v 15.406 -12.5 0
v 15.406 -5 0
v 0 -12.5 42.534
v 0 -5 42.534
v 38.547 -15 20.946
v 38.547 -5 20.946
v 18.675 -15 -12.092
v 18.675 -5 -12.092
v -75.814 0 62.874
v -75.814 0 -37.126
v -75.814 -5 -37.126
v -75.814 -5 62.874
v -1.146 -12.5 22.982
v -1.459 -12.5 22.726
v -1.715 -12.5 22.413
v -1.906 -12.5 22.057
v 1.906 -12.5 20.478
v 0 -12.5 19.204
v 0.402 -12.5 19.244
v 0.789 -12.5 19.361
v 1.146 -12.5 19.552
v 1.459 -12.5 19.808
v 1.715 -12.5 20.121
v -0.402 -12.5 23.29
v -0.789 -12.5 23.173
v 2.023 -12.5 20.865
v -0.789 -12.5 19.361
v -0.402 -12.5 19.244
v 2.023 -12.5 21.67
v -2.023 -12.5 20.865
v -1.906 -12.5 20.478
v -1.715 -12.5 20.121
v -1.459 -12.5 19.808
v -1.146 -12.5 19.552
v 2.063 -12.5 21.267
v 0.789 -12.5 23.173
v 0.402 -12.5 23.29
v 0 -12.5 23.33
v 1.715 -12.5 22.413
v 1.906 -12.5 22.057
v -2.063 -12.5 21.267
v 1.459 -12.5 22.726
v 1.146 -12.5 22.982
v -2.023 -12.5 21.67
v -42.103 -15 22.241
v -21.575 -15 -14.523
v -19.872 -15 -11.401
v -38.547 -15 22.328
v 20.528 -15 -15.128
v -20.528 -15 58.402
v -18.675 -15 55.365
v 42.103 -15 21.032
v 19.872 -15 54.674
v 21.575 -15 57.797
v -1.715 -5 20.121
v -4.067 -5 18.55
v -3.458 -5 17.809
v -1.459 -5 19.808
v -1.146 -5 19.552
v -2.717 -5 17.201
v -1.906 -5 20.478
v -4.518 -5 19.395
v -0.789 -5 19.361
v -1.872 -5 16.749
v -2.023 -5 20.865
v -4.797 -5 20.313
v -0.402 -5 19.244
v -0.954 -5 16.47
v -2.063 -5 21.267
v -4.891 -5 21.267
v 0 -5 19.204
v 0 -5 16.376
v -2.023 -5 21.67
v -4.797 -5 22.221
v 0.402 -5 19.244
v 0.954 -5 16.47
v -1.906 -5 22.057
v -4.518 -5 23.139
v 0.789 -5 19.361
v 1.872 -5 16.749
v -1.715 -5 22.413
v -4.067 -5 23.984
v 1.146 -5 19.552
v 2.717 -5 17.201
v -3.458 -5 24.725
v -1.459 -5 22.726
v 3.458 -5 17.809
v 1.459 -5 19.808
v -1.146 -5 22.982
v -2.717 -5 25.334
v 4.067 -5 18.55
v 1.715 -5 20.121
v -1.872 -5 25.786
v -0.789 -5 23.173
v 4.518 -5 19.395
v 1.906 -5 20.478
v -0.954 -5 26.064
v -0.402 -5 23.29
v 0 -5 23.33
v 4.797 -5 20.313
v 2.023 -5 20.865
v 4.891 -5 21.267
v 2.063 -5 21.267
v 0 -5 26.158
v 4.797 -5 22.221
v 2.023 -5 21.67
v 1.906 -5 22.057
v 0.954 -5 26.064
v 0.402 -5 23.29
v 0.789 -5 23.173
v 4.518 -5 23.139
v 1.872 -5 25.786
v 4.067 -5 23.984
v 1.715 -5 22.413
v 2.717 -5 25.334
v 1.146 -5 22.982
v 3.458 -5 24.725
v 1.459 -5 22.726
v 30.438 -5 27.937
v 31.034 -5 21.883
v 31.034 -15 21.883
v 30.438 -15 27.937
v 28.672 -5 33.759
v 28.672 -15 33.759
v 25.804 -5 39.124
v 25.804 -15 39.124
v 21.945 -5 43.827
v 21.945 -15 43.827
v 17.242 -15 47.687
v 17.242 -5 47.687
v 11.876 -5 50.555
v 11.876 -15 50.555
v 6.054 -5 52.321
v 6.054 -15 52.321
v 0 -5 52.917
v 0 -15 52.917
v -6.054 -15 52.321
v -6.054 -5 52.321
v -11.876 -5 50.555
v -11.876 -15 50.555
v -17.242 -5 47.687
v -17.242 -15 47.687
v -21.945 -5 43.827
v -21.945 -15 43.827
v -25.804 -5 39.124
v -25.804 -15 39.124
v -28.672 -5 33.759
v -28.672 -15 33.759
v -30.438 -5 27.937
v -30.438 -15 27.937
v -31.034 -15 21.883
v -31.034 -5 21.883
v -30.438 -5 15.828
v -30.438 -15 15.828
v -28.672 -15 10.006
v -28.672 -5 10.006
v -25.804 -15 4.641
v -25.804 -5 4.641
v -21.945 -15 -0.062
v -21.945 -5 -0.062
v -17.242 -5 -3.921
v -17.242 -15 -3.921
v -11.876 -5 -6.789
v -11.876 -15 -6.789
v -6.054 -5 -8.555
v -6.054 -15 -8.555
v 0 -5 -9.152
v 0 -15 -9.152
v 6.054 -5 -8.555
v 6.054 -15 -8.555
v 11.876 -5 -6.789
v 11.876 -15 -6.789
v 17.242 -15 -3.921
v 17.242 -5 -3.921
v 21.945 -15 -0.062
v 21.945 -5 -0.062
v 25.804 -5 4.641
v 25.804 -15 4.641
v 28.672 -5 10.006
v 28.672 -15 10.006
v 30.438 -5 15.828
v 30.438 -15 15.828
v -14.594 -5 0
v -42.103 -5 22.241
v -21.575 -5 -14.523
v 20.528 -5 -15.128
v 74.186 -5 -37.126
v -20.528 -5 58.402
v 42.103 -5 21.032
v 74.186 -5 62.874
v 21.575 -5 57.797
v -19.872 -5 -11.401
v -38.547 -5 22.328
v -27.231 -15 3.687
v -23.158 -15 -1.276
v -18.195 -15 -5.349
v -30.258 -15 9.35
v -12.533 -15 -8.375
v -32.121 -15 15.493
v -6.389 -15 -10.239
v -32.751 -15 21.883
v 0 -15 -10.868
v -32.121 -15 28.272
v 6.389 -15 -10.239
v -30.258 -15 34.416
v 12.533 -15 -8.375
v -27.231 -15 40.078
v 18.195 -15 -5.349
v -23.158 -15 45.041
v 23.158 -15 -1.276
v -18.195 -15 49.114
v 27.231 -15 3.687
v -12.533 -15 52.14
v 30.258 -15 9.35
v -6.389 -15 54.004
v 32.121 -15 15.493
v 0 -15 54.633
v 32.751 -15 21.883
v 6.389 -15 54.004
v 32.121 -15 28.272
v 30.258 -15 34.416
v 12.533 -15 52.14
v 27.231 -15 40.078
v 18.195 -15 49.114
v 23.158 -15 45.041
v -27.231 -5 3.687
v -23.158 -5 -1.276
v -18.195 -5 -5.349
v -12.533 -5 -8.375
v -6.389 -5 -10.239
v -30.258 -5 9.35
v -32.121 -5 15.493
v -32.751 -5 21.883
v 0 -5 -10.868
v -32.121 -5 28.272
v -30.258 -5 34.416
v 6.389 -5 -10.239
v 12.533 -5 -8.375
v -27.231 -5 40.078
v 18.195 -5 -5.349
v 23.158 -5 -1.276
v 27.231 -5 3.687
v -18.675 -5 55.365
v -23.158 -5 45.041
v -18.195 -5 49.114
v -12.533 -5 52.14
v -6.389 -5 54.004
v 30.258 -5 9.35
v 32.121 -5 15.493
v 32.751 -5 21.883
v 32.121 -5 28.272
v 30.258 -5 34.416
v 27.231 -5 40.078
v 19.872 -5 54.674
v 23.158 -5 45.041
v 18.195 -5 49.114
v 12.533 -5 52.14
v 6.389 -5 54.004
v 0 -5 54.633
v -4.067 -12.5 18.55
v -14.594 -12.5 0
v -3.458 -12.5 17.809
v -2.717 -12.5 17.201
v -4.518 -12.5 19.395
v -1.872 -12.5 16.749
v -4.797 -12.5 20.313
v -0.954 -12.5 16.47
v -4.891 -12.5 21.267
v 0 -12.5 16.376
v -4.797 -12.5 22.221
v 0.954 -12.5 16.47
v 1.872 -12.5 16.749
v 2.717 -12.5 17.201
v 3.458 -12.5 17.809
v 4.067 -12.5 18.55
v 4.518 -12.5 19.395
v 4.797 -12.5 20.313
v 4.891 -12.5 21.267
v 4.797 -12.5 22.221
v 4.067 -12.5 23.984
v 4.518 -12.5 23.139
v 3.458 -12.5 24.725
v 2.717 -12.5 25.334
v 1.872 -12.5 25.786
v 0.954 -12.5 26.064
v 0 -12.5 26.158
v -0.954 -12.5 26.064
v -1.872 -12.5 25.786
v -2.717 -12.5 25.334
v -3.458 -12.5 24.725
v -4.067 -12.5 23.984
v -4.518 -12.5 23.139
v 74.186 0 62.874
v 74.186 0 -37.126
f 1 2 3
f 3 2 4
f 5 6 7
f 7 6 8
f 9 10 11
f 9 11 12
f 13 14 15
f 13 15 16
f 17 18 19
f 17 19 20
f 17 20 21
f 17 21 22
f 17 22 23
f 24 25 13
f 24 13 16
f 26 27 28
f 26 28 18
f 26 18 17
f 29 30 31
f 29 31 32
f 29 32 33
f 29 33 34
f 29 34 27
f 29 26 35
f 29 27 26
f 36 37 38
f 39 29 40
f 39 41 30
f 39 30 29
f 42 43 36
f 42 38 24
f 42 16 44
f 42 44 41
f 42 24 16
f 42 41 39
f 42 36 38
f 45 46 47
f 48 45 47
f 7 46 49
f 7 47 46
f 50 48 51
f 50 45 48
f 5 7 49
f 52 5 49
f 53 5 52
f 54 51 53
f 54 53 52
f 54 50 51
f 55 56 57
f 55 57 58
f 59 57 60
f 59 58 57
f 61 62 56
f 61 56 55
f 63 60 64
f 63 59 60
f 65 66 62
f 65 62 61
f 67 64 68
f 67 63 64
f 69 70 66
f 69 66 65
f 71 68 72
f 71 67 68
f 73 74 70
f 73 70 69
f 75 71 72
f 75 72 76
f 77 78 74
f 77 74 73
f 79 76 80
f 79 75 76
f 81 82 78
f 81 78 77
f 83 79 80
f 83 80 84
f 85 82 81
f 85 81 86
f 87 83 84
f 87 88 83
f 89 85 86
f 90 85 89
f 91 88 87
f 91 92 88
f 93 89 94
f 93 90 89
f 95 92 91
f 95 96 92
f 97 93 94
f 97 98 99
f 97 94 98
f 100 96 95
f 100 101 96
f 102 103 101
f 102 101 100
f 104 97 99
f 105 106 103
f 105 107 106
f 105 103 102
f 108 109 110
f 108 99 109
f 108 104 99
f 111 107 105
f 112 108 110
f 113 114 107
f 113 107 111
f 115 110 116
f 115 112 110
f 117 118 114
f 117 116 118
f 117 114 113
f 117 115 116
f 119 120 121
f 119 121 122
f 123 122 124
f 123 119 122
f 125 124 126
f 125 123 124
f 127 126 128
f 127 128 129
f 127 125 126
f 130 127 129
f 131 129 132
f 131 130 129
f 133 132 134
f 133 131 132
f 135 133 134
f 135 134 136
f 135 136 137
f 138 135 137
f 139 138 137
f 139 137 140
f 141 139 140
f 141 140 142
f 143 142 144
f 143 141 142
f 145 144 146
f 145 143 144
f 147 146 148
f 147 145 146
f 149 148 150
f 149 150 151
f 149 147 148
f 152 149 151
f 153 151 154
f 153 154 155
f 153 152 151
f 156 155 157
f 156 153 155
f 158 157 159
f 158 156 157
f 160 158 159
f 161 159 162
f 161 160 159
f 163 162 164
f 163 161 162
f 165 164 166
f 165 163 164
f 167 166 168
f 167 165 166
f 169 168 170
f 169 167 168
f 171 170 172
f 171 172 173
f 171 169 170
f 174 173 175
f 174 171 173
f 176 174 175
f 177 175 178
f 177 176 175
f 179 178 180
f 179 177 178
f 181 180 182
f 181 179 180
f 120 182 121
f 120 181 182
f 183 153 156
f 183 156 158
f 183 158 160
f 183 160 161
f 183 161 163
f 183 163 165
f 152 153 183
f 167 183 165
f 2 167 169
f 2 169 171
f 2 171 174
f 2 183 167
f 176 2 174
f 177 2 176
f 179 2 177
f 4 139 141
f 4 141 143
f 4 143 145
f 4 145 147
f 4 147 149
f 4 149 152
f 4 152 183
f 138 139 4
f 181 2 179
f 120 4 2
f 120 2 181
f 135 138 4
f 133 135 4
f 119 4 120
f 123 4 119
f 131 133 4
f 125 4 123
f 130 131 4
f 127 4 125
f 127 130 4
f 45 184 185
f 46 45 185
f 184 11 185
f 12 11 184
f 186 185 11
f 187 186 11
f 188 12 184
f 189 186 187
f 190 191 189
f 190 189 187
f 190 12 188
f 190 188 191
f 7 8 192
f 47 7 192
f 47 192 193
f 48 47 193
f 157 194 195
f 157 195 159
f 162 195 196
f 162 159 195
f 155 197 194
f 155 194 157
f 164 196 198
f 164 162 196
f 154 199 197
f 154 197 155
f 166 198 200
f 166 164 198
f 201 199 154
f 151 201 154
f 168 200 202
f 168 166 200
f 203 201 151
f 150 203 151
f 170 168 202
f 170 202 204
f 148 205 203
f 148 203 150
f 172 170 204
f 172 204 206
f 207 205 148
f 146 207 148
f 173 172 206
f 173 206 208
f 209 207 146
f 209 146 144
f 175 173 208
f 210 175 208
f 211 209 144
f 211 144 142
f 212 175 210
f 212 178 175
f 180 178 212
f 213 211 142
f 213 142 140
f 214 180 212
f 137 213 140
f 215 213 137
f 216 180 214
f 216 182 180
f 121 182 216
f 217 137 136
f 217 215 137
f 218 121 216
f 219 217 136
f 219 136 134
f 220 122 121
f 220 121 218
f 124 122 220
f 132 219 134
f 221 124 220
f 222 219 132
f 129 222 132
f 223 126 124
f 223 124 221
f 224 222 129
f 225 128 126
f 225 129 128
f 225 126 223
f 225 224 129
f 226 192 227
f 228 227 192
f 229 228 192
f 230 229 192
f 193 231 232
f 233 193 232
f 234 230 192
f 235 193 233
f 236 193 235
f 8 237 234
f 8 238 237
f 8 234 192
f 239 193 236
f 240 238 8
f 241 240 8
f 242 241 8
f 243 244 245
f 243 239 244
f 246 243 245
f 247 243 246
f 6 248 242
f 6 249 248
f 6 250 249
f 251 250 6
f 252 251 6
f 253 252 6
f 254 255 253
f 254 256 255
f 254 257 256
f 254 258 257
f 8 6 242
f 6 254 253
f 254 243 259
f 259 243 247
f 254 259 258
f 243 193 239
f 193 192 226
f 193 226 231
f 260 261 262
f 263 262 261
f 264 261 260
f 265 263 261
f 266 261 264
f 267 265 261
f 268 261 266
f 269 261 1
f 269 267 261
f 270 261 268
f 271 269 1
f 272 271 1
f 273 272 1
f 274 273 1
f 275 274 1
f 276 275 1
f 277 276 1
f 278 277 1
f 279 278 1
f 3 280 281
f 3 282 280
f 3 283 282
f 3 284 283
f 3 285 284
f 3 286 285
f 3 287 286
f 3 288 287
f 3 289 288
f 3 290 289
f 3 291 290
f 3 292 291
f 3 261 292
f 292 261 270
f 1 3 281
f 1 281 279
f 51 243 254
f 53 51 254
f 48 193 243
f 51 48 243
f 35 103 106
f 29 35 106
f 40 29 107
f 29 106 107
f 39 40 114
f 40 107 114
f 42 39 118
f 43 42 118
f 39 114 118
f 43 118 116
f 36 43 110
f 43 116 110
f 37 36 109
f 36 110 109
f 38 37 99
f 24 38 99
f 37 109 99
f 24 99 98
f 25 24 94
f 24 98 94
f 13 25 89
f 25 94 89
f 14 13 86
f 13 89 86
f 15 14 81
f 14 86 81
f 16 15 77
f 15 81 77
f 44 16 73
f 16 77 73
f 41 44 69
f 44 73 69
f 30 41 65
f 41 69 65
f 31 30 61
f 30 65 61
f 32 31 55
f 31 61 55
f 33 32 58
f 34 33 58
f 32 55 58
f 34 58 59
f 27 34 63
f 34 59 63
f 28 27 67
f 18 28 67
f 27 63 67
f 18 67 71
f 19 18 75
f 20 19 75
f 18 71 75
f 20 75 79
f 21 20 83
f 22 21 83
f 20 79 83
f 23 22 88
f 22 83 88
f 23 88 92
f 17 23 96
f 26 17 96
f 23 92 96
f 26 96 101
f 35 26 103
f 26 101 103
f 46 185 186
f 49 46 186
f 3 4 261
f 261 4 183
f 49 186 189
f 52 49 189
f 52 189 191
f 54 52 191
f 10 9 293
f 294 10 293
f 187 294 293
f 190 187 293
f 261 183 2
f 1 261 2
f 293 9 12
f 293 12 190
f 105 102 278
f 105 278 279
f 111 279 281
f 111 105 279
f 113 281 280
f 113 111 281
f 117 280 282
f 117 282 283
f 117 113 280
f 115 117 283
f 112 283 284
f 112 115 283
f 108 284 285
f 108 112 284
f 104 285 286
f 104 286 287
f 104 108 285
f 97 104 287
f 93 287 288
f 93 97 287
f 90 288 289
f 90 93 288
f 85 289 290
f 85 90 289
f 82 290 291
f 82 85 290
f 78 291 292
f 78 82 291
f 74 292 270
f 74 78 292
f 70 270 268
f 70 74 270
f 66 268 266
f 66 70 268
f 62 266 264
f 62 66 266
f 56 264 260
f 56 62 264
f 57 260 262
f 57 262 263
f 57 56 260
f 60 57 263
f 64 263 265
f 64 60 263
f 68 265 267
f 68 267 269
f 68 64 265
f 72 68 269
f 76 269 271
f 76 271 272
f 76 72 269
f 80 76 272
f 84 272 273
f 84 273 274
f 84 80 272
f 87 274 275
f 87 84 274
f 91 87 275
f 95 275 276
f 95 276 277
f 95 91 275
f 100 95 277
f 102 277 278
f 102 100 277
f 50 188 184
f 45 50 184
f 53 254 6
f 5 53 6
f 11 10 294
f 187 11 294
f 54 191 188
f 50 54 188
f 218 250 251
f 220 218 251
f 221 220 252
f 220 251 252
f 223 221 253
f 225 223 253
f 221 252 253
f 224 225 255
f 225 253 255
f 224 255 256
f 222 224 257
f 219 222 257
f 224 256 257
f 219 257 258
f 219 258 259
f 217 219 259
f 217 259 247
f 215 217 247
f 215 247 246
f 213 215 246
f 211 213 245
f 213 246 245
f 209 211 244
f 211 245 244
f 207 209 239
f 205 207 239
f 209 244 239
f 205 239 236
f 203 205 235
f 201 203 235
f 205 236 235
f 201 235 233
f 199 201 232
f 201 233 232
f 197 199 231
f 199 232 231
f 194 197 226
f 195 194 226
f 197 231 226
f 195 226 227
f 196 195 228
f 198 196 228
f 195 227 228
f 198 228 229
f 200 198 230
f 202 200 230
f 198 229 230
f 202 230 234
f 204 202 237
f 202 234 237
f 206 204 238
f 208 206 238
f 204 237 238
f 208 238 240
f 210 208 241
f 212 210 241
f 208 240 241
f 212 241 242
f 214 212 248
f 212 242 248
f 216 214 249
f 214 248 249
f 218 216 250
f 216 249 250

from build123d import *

# Parameters (mm, degrees)
F0_W     = 150
F0_H     = 100
F1_DEPTH = 5
F2_R     = 4.890759
F2_R_2   = 2.063012
F3_DEPTH = 7.5
F5_DEPTH = 10
F6_R     = 32.750656
F6_R_2   = 31.034289
F7_DEPTH = 10


with BuildPart() as f1:
    # F0 (on Front) → F1 (new body)
    with BuildSketch(Plane.XZ):
        with Locations((-0.814352, 12.874251)):
            Rectangle(F0_W, F0_H)
    extrude(amount=F1_DEPTH)

    # F2 (on face) → F3 (join)
    with BuildSketch(Plane.XZ.offset(5)):
        Polygon((0, 42.534135), (-14.594158, 0), (15.405842, 0), align=None)
        with Locations((0, 21.267068)):
            Circle(F2_R, mode=Mode.SUBTRACT)
        with Locations((0, 21.267068)):
            Circle(F2_R_2)
    extrude(amount=F3_DEPTH)

    # F4 (on face) → F5 (join)
    with BuildSketch(Plane.XZ.offset(5)):
        Polygon((-20.528079, 58.401592), (-42.103289, 22.241354), (-21.57521, -14.523444), (20.528079, -15.128005), (42.103289, 21.032233), (21.57521, 57.797031), align=None)
        Polygon((-19.871907, -11.400712), (-38.547273, 22.327617), (-18.675366, 55.365123), (19.871907, 54.674299), (38.547273, 20.94597), (18.675366, -12.091536), align=None, mode=Mode.SUBTRACT)
    extrude(amount=F5_DEPTH)

    # F6 (on face) → F7 (join)
    with BuildSketch(Plane.XZ.offset(5)):
        with Locations((0, 21.882644)):
            Circle(F6_R)
        with Locations((0, 21.882644)):
            Circle(F6_R_2, mode=Mode.SUBTRACT)
    extrude(amount=F7_DEPTH)


solid = f1.part
